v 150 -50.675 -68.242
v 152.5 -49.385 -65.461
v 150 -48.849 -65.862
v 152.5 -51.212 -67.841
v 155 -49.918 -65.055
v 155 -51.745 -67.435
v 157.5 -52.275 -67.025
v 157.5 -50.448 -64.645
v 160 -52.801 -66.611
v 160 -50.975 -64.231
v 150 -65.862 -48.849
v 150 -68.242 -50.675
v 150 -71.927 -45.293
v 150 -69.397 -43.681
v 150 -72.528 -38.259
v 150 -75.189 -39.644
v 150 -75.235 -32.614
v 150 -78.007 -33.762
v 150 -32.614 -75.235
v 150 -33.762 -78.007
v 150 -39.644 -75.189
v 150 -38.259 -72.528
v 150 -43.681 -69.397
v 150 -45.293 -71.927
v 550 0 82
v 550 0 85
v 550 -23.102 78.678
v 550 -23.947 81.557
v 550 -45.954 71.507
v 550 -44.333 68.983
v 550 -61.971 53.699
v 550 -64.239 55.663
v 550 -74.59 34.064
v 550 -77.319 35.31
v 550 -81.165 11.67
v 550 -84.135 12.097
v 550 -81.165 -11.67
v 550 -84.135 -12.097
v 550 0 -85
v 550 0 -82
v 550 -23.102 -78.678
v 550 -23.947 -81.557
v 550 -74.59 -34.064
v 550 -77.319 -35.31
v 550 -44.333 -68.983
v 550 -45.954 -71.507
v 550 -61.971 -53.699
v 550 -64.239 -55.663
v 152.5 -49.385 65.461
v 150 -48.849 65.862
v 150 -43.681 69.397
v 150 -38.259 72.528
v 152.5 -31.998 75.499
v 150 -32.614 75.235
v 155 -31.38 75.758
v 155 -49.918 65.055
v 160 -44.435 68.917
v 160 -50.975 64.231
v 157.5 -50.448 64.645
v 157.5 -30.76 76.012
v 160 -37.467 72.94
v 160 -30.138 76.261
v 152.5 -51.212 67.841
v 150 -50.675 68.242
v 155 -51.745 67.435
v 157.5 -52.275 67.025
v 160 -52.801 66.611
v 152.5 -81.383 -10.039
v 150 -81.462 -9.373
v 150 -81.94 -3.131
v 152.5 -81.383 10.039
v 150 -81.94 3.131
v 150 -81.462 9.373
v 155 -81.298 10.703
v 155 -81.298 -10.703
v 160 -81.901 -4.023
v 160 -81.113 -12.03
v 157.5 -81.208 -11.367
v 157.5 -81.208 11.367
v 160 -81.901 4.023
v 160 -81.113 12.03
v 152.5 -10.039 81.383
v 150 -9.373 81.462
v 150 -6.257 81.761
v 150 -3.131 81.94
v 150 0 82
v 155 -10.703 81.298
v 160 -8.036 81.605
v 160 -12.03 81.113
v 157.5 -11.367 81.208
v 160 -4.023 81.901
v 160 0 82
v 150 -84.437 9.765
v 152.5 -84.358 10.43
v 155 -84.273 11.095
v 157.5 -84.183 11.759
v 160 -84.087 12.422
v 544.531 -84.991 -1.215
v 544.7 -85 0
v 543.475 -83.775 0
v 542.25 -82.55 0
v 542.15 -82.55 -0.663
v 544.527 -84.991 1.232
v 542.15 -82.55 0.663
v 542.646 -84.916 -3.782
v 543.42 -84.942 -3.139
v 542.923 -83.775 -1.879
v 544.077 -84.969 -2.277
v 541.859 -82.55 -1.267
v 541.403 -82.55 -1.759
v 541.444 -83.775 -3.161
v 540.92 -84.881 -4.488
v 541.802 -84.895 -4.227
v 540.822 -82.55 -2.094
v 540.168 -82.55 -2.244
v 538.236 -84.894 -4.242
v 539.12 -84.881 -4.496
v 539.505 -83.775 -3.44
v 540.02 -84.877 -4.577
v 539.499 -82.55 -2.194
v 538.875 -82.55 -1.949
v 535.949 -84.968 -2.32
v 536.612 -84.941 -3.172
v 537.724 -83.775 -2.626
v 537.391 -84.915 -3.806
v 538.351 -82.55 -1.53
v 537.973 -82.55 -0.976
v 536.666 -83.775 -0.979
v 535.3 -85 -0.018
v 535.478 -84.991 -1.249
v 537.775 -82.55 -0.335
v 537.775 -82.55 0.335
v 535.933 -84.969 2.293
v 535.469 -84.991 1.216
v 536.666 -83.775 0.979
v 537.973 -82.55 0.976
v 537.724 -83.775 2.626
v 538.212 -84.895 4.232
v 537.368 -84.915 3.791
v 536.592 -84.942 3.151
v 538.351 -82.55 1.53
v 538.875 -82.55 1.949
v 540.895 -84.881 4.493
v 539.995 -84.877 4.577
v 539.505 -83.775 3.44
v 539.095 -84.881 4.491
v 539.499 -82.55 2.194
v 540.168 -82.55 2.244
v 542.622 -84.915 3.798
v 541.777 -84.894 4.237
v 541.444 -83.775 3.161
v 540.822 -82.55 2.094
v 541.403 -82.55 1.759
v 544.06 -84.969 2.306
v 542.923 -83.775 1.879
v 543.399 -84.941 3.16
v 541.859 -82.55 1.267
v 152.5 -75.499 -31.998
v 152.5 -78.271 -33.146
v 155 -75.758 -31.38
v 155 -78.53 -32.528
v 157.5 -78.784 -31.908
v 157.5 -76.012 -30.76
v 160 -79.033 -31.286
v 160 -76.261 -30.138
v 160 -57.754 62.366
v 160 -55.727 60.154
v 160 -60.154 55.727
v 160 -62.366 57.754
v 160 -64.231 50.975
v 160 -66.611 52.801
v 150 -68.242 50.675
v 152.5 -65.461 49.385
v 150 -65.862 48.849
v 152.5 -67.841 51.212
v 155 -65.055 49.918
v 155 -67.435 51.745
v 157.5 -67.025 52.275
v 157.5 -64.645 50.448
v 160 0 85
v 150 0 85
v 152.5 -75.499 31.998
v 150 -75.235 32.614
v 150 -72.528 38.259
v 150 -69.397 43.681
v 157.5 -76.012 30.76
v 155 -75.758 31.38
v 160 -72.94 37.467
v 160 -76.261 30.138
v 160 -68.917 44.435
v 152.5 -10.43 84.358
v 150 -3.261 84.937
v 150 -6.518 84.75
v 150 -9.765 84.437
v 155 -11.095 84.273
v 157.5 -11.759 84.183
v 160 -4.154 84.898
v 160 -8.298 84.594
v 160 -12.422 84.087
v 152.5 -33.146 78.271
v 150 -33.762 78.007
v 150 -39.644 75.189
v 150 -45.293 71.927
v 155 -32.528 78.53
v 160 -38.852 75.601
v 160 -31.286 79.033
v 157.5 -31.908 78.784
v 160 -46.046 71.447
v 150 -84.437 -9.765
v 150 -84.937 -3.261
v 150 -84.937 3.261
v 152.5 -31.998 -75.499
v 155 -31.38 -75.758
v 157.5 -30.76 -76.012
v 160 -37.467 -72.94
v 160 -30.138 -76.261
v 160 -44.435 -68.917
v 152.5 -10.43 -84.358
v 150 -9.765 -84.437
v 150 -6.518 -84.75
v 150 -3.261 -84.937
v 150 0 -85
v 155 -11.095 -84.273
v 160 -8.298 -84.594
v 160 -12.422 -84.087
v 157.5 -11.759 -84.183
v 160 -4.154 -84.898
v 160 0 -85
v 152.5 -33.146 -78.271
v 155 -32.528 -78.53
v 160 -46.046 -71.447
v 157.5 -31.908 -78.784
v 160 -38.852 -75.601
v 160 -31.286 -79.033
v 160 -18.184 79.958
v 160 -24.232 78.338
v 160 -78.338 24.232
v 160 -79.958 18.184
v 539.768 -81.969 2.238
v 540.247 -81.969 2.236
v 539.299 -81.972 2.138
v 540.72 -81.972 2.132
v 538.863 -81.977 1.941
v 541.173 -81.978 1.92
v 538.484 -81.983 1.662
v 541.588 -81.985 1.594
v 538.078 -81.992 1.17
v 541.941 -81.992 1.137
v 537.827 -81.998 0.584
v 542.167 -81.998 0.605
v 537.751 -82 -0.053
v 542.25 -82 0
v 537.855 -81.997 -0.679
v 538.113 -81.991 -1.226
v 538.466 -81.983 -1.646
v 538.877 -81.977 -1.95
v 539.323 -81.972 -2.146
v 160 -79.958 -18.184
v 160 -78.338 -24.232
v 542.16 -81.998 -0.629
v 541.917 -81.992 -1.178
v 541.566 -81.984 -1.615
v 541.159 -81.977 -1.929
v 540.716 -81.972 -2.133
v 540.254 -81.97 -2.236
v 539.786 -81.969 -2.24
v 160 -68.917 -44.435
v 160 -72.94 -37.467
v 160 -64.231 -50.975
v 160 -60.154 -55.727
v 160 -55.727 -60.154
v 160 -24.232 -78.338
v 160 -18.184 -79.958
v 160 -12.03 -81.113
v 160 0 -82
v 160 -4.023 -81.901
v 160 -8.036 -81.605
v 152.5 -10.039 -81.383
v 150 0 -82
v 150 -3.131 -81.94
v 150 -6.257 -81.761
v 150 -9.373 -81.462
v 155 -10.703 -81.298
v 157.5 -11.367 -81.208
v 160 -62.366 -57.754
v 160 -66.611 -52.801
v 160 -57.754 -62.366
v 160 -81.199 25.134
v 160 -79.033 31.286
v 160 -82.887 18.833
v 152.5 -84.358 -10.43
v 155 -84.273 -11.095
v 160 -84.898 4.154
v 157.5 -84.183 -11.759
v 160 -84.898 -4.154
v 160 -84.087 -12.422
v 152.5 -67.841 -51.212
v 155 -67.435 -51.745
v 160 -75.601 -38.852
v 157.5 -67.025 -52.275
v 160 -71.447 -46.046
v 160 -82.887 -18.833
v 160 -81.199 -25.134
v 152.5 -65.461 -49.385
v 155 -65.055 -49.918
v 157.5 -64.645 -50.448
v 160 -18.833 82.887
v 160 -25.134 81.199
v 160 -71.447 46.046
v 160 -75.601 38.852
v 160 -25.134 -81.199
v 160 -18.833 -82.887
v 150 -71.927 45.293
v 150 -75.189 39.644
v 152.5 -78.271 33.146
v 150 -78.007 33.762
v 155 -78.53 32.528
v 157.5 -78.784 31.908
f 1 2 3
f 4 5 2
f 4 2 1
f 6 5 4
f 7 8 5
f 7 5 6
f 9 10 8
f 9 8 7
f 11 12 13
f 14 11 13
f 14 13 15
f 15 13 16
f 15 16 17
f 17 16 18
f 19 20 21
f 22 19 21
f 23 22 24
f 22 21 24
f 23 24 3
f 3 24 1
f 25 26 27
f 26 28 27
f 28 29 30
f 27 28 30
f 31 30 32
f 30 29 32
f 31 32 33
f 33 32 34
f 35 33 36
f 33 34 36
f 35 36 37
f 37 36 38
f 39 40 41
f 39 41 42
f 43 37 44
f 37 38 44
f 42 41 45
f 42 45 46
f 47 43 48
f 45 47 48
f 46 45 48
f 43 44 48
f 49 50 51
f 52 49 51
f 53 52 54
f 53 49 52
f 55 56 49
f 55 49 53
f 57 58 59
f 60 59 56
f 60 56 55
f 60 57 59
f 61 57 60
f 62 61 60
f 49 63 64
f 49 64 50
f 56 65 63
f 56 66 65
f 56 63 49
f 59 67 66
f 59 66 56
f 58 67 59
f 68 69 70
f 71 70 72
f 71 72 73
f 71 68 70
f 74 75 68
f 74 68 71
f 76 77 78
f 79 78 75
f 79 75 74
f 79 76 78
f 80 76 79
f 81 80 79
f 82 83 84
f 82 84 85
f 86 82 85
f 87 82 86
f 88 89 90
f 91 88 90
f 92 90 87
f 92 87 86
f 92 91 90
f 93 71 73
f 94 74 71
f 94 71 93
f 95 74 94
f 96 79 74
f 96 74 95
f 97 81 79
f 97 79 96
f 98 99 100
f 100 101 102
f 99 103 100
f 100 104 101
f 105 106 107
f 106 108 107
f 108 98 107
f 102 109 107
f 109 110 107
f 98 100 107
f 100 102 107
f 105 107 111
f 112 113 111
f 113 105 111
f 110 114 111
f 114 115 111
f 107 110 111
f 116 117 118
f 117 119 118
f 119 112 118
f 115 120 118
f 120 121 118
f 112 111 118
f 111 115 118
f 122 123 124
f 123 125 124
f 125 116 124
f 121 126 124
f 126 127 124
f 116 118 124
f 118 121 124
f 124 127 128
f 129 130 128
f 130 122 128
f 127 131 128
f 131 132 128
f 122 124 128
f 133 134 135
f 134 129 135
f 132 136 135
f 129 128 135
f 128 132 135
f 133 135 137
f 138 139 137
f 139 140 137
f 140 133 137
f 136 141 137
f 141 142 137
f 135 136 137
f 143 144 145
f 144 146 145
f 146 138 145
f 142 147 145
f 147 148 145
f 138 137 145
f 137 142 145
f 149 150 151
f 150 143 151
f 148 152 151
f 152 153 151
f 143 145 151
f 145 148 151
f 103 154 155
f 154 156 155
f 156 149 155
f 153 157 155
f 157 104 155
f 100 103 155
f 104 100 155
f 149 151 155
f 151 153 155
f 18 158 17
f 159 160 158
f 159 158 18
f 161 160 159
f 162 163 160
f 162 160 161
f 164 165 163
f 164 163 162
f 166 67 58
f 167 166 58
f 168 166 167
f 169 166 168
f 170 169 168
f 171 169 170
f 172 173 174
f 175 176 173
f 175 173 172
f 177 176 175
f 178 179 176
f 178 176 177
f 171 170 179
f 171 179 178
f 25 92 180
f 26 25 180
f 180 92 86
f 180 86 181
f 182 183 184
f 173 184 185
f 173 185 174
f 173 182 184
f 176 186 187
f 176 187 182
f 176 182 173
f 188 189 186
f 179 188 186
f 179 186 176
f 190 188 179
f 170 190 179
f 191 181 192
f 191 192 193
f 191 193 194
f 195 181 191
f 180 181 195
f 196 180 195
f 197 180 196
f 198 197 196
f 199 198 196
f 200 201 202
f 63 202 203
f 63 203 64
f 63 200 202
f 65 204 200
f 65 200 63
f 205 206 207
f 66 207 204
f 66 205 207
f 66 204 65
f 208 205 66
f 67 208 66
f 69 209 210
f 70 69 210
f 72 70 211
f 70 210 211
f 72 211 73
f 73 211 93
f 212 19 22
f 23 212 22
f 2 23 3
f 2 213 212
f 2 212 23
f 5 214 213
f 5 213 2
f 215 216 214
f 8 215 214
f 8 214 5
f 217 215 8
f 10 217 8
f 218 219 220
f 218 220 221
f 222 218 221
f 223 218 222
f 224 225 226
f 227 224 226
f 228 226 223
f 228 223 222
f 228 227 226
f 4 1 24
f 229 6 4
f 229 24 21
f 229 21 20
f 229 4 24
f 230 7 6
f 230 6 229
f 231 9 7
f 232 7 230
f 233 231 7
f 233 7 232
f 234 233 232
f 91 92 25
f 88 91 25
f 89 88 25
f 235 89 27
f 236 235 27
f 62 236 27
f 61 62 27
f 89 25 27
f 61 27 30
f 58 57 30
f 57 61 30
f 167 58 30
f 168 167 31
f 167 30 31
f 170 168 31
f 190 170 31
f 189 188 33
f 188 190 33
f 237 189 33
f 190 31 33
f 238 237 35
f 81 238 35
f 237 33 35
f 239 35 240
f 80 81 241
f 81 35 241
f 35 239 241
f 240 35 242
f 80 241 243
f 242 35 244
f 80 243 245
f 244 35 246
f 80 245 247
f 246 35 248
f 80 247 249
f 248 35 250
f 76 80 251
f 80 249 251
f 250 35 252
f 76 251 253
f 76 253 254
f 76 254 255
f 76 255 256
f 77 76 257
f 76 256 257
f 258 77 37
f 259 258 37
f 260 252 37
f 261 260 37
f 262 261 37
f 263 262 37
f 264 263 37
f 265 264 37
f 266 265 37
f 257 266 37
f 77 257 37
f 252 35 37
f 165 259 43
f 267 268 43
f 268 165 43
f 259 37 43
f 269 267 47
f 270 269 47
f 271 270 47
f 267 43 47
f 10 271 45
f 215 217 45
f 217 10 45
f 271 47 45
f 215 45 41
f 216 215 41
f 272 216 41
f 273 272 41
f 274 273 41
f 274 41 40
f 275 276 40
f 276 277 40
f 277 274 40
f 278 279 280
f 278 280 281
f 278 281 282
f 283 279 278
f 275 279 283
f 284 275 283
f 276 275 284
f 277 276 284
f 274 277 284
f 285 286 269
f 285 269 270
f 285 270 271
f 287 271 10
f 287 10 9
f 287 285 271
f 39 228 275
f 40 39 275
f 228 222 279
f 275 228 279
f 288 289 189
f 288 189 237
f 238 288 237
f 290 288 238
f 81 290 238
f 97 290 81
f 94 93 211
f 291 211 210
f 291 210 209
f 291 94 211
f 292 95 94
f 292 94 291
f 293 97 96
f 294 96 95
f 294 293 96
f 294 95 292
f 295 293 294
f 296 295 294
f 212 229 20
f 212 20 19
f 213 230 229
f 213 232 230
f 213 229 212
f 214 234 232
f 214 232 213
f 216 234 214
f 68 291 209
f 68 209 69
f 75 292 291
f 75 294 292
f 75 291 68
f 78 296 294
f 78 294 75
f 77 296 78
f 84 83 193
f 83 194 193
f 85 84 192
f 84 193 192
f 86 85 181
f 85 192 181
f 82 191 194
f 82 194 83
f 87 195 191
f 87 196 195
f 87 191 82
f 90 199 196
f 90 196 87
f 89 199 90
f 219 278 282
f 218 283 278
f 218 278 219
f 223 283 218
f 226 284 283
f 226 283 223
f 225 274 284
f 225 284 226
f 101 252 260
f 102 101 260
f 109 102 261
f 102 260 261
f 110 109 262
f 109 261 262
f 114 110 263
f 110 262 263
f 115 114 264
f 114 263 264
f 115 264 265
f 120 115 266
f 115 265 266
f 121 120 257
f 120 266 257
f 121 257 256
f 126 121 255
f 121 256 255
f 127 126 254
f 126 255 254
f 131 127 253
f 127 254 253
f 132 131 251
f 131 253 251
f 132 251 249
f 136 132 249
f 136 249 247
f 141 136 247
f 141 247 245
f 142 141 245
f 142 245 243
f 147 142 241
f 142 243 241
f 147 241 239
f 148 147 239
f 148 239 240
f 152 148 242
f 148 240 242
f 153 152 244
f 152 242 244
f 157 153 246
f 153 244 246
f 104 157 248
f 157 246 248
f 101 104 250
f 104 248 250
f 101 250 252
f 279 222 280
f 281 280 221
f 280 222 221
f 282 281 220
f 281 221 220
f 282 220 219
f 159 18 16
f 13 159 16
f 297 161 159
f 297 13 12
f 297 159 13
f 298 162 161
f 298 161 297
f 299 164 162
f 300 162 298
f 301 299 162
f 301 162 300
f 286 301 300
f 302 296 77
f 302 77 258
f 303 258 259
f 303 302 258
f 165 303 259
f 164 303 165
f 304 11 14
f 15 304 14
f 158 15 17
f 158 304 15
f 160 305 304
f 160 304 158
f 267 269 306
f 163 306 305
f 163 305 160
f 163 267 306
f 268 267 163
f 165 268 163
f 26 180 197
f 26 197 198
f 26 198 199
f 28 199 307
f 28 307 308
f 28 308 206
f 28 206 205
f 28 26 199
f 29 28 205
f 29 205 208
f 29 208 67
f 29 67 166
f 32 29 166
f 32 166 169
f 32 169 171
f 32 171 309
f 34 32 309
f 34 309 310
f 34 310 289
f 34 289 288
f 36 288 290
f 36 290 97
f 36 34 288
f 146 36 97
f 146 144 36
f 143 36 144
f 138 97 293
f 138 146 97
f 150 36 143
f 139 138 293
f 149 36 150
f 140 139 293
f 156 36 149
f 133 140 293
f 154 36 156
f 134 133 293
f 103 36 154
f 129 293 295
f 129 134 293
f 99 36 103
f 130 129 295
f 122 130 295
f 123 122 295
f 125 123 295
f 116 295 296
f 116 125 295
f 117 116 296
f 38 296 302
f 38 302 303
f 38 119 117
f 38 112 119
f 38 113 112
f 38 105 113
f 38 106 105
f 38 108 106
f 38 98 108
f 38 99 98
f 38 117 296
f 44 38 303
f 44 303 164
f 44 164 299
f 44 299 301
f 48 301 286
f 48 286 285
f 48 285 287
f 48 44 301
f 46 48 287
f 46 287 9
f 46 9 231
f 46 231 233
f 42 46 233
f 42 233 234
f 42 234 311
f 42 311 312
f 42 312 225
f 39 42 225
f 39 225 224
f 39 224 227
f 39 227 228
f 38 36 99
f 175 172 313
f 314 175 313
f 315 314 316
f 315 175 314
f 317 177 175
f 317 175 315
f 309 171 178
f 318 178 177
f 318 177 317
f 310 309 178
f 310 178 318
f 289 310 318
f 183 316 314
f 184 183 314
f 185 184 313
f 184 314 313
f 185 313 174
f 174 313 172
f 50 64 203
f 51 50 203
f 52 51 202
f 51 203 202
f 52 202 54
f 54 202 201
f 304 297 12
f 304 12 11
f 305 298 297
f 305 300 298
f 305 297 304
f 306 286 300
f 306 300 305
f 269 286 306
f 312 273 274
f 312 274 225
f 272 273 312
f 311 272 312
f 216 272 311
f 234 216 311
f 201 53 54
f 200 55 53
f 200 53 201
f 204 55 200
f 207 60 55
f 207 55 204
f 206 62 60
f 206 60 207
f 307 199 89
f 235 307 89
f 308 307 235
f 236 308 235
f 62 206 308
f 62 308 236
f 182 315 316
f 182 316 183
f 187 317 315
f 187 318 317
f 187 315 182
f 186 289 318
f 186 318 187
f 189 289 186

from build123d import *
from build123d.topology import SkipClean

# Parameters (mm, degrees)
SKETCH1_W                      = 390
SKETCH1_H                      = 3
BOSS_EXTRUDE1_DEPTH            = 5
DRAFT1_ANGLE                   = -15
CIRPATTERN1_COUNT              = 12
DRAFT1_OF_CIRPATTERN1_2_ANGLE  = -15
DRAFT1_OF_CIRPATTERN1_3_ANGLE  = -15
DRAFT1_OF_CIRPATTERN1_4_ANGLE  = -15
DRAFT1_OF_CIRPATTERN1_5_ANGLE  = -15
DRAFT1_OF_CIRPATTERN1_6_ANGLE  = -15
DRAFT1_OF_CIRPATTERN1_7_ANGLE  = -15
DRAFT1_OF_CIRPATTERN1_8_ANGLE  = -15
DRAFT1_OF_CIRPATTERN1_9_ANGLE  = -15
DRAFT1_OF_CIRPATTERN1_10_ANGLE = -15
DRAFT1_OF_CIRPATTERN1_11_ANGLE = -15
DRAFT1_OF_CIRPATTERN1_12_ANGLE = -15
CUT_EXTRUDE1_DEPTH             = 563.983125857


# Read off the part's stored shape, not the designer's step: CSK for M4 Countersunk Flat Head Screw1
with BuildPart() as part:
    # Sketch1 → Revolve1 (revolve)
    with BuildSketch(Plane.XY, mode=Mode.PRIVATE) as revolve1_sk:
        with Locations((355, 83.5)):
            Rectangle(SKETCH1_W, SKETCH1_H)
    revolve(revolve1_sk.sketch.rotate(Axis((0, 0, 0), (1, 0, 0)), 90), axis=Axis((0, 0, 0), (1, 0, 0)))

    # Sketch2 → Boss-Extrude1 (add, symmetric)
    with BuildSketch(Plane(origin=(155, 0, 0), x_dir=(0, 0, -1), z_dir=(1, 0, 0))):
        with BuildLine():
            Line((10.703147762, 81.298478633), (11.094726339, 84.272813217))
            ThreePointArc((11.094726339, 84.272813217), (0, 85), (-11.094726339, 84.272813217))
            Line((-11.094726339, 84.272813217), (-10.703147762, 81.298478633))
            ThreePointArc((-10.703147762, 81.298478633), (0, 82), (10.703147762, 81.298478633))
        make_face()
    boss_extrude1 = extrude(amount=BOSS_EXTRUDE1_DEPTH, both=True)

    # Draft1
    draft1_faces = [part.faces().sort_by_distance(p)[0] for p in [
        (155, 82.785645925, 10.89893705),
        (155, 82.785645925, -10.89893705),
    ]]
    draft(draft1_faces, Plane(origin=(155, 0, 0), x_dir=(0, 0, 1), z_dir=(1, 0, 0)), DRAFT1_ANGLE)

    # CirPattern1: Boss-Extrude1 ×12 about axis
    with SkipClean():  # the faces are left unmerged after this step: merging them gives an invalid solid
        cirpattern1_axis = Axis((0, 0, 0), (1, 0, 0))
        for i in range(1, CIRPATTERN1_COUNT):
            add(boss_extrude1.rotate(cirpattern1_axis, i * 360 / CIRPATTERN1_COUNT))

    # Draft1 of CirPattern1 2
    draft1_of_cirpattern1_2_faces = [part.faces().sort_by_distance(p)[0] for p in [
        (155, 66.245003914, 50.831579322),
        (155, 77.143940965, 31.954066602),
    ]]
    draft(draft1_of_cirpattern1_2_faces, Plane(origin=(155, 0, 0), x_dir=(0, -0.49999999999999994, 0.8660254037844387), z_dir=(1, 0, 0)), DRAFT1_OF_CIRPATTERN1_2_ANGLE)

    # Draft1 of CirPattern1 3
    draft1_of_cirpattern1_3_faces = [part.faces().sort_by_distance(p)[0] for p in [
        (155, 31.954066602, 77.143940965),
        (155, 50.831579322, 66.245003914),
    ]]
    draft(draft1_of_cirpattern1_3_faces, Plane(origin=(155, 0, 0), x_dir=(0, -0.8660254037844386, 0.5000000000000001), z_dir=(1, 0, 0)), DRAFT1_OF_CIRPATTERN1_3_ANGLE)

    # Draft1 of CirPattern1 4
    draft1_of_cirpattern1_4_faces = [part.faces().sort_by_distance(p)[0] for p in [
        (155, -10.89893705, 82.785645925),
        (155, 10.89893705, 82.785645925),
    ]]
    draft(draft1_of_cirpattern1_4_faces, Plane(origin=(155, 0, 0), x_dir=(0, -1, 0), z_dir=(1, 0, 0)), DRAFT1_OF_CIRPATTERN1_4_ANGLE)

    # Draft1 of CirPattern1 5
    draft1_of_cirpattern1_5_faces = [part.faces().sort_by_distance(p)[0] for p in [
        (155, -50.831579322, 66.245003914),
        (155, -31.954066602, 77.143940965),
    ]]
    draft(draft1_of_cirpattern1_5_faces, Plane(origin=(155, 0, 0), x_dir=(0, -0.8660254037844387, -0.4999999999999998), z_dir=(1, 0, 0)), DRAFT1_OF_CIRPATTERN1_5_ANGLE)

    # Draft1 of CirPattern1 6
    draft1_of_cirpattern1_6_faces = [part.faces().sort_by_distance(p)[0] for p in [
        (155, -77.143940965, 31.954066602),
        (155, -66.245003914, 50.831579322),
    ]]
    draft(draft1_of_cirpattern1_6_faces, Plane(origin=(155, 0, 0), x_dir=(0, -0.49999999999999994, -0.8660254037844387), z_dir=(1, 0, 0)), DRAFT1_OF_CIRPATTERN1_6_ANGLE)

    # Draft1 of CirPattern1 7
    draft1_of_cirpattern1_7_faces = [part.faces().sort_by_distance(p)[0] for p in [
        (155, -82.785645925, -10.89893705),
        (155, -82.785645925, 10.89893705),
    ]]
    draft(draft1_of_cirpattern1_7_faces, Plane(origin=(155, 0, 0), x_dir=(0, 0, -1), z_dir=(1, 0, 0)), DRAFT1_OF_CIRPATTERN1_7_ANGLE)

    # Draft1 of CirPattern1 8
    draft1_of_cirpattern1_8_faces = [part.faces().sort_by_distance(p)[0] for p in [
        (155, -66.245003914, -50.831579322),
        (155, -77.143940965, -31.954066602),
    ]]
    draft(draft1_of_cirpattern1_8_faces, Plane(origin=(155, 0, 0), x_dir=(0, 0.5000000000000001, -0.8660254037844386), z_dir=(1, 0, 0)), DRAFT1_OF_CIRPATTERN1_8_ANGLE)

    # Draft1 of CirPattern1 9
    draft1_of_cirpattern1_9_faces = [part.faces().sort_by_distance(p)[0] for p in [
        (155, -31.954066602, -77.143940965),
        (155, -50.831579322, -66.245003914),
    ]]
    draft(draft1_of_cirpattern1_9_faces, Plane(origin=(155, 0, 0), x_dir=(0, 0.8660254037844384, -0.5000000000000004), z_dir=(1, 0, 0)), DRAFT1_OF_CIRPATTERN1_9_ANGLE)

    # Draft1 of CirPattern1 10
    draft1_of_cirpattern1_10_faces = [part.faces().sort_by_distance(p)[0] for p in [
        (155, 10.89893705, -82.785645925),
        (155, -10.89893705, -82.785645925),
    ]]
    draft(draft1_of_cirpattern1_10_faces, Plane.YZ.offset(155), DRAFT1_OF_CIRPATTERN1_10_ANGLE)

    # Draft1 of CirPattern1 11
    draft1_of_cirpattern1_11_faces = [part.faces().sort_by_distance(p)[0] for p in [
        (155, 50.831579322, -66.245003914),
        (155, 31.954066602, -77.143940965),
    ]]
    draft(draft1_of_cirpattern1_11_faces, Plane(origin=(155, 0, 0), x_dir=(0, 0.8660254037844386, 0.5000000000000001), z_dir=(1, 0, 0)), DRAFT1_OF_CIRPATTERN1_11_ANGLE)

    # Draft1 of CirPattern1 12
    draft1_of_cirpattern1_12_faces = [part.faces().sort_by_distance(p)[0] for p in [
        (155, 77.143940965, -31.954066602),
        (155, 66.245003914, -50.831579322),
    ]]
    draft(draft1_of_cirpattern1_12_faces, Plane(origin=(155, 0, 0), x_dir=(0, 0.5000000000000004, 0.8660254037844384), z_dir=(1, 0, 0)), DRAFT1_OF_CIRPATTERN1_12_ANGLE)

    # Sketch3 → Cut-Extrude1 (cut, through all)
    with BuildSketch(Plane(origin=(0, 0, 0), x_dir=(0, 0, -1), z_dir=(1, 0, 0))):
        with BuildLine():
            Line((0, 0), (-85, 0))
            ThreePointArc((-85, 0), (0, 85), (85, 0))
            Line((85, 0), (0, 0))
        make_face()
    extrude(amount=CUT_EXTRUDE1_DEPTH, mode=Mode.SUBTRACT)

    # CSK for M4 Countersunk Flat Head Scr 2 → CSK for M4 Countersunk Flat Head Screw1 (revolve, cut)
    with BuildSketch(Plane(origin=(540, 0, 0), x_dir=(1, 0, 0), z_dir=(0, 0, 1))):
        Polygon((0, -85.000032153), (4.700032153, -85.000032153), (2.25, -82.55), (2.25, -81.96910869), (0, -81.96910869), align=None)
    revolve(axis=Axis((540, 0, 0), (0, 1, 0)), mode=Mode.SUBTRACT)


solid = part.part
